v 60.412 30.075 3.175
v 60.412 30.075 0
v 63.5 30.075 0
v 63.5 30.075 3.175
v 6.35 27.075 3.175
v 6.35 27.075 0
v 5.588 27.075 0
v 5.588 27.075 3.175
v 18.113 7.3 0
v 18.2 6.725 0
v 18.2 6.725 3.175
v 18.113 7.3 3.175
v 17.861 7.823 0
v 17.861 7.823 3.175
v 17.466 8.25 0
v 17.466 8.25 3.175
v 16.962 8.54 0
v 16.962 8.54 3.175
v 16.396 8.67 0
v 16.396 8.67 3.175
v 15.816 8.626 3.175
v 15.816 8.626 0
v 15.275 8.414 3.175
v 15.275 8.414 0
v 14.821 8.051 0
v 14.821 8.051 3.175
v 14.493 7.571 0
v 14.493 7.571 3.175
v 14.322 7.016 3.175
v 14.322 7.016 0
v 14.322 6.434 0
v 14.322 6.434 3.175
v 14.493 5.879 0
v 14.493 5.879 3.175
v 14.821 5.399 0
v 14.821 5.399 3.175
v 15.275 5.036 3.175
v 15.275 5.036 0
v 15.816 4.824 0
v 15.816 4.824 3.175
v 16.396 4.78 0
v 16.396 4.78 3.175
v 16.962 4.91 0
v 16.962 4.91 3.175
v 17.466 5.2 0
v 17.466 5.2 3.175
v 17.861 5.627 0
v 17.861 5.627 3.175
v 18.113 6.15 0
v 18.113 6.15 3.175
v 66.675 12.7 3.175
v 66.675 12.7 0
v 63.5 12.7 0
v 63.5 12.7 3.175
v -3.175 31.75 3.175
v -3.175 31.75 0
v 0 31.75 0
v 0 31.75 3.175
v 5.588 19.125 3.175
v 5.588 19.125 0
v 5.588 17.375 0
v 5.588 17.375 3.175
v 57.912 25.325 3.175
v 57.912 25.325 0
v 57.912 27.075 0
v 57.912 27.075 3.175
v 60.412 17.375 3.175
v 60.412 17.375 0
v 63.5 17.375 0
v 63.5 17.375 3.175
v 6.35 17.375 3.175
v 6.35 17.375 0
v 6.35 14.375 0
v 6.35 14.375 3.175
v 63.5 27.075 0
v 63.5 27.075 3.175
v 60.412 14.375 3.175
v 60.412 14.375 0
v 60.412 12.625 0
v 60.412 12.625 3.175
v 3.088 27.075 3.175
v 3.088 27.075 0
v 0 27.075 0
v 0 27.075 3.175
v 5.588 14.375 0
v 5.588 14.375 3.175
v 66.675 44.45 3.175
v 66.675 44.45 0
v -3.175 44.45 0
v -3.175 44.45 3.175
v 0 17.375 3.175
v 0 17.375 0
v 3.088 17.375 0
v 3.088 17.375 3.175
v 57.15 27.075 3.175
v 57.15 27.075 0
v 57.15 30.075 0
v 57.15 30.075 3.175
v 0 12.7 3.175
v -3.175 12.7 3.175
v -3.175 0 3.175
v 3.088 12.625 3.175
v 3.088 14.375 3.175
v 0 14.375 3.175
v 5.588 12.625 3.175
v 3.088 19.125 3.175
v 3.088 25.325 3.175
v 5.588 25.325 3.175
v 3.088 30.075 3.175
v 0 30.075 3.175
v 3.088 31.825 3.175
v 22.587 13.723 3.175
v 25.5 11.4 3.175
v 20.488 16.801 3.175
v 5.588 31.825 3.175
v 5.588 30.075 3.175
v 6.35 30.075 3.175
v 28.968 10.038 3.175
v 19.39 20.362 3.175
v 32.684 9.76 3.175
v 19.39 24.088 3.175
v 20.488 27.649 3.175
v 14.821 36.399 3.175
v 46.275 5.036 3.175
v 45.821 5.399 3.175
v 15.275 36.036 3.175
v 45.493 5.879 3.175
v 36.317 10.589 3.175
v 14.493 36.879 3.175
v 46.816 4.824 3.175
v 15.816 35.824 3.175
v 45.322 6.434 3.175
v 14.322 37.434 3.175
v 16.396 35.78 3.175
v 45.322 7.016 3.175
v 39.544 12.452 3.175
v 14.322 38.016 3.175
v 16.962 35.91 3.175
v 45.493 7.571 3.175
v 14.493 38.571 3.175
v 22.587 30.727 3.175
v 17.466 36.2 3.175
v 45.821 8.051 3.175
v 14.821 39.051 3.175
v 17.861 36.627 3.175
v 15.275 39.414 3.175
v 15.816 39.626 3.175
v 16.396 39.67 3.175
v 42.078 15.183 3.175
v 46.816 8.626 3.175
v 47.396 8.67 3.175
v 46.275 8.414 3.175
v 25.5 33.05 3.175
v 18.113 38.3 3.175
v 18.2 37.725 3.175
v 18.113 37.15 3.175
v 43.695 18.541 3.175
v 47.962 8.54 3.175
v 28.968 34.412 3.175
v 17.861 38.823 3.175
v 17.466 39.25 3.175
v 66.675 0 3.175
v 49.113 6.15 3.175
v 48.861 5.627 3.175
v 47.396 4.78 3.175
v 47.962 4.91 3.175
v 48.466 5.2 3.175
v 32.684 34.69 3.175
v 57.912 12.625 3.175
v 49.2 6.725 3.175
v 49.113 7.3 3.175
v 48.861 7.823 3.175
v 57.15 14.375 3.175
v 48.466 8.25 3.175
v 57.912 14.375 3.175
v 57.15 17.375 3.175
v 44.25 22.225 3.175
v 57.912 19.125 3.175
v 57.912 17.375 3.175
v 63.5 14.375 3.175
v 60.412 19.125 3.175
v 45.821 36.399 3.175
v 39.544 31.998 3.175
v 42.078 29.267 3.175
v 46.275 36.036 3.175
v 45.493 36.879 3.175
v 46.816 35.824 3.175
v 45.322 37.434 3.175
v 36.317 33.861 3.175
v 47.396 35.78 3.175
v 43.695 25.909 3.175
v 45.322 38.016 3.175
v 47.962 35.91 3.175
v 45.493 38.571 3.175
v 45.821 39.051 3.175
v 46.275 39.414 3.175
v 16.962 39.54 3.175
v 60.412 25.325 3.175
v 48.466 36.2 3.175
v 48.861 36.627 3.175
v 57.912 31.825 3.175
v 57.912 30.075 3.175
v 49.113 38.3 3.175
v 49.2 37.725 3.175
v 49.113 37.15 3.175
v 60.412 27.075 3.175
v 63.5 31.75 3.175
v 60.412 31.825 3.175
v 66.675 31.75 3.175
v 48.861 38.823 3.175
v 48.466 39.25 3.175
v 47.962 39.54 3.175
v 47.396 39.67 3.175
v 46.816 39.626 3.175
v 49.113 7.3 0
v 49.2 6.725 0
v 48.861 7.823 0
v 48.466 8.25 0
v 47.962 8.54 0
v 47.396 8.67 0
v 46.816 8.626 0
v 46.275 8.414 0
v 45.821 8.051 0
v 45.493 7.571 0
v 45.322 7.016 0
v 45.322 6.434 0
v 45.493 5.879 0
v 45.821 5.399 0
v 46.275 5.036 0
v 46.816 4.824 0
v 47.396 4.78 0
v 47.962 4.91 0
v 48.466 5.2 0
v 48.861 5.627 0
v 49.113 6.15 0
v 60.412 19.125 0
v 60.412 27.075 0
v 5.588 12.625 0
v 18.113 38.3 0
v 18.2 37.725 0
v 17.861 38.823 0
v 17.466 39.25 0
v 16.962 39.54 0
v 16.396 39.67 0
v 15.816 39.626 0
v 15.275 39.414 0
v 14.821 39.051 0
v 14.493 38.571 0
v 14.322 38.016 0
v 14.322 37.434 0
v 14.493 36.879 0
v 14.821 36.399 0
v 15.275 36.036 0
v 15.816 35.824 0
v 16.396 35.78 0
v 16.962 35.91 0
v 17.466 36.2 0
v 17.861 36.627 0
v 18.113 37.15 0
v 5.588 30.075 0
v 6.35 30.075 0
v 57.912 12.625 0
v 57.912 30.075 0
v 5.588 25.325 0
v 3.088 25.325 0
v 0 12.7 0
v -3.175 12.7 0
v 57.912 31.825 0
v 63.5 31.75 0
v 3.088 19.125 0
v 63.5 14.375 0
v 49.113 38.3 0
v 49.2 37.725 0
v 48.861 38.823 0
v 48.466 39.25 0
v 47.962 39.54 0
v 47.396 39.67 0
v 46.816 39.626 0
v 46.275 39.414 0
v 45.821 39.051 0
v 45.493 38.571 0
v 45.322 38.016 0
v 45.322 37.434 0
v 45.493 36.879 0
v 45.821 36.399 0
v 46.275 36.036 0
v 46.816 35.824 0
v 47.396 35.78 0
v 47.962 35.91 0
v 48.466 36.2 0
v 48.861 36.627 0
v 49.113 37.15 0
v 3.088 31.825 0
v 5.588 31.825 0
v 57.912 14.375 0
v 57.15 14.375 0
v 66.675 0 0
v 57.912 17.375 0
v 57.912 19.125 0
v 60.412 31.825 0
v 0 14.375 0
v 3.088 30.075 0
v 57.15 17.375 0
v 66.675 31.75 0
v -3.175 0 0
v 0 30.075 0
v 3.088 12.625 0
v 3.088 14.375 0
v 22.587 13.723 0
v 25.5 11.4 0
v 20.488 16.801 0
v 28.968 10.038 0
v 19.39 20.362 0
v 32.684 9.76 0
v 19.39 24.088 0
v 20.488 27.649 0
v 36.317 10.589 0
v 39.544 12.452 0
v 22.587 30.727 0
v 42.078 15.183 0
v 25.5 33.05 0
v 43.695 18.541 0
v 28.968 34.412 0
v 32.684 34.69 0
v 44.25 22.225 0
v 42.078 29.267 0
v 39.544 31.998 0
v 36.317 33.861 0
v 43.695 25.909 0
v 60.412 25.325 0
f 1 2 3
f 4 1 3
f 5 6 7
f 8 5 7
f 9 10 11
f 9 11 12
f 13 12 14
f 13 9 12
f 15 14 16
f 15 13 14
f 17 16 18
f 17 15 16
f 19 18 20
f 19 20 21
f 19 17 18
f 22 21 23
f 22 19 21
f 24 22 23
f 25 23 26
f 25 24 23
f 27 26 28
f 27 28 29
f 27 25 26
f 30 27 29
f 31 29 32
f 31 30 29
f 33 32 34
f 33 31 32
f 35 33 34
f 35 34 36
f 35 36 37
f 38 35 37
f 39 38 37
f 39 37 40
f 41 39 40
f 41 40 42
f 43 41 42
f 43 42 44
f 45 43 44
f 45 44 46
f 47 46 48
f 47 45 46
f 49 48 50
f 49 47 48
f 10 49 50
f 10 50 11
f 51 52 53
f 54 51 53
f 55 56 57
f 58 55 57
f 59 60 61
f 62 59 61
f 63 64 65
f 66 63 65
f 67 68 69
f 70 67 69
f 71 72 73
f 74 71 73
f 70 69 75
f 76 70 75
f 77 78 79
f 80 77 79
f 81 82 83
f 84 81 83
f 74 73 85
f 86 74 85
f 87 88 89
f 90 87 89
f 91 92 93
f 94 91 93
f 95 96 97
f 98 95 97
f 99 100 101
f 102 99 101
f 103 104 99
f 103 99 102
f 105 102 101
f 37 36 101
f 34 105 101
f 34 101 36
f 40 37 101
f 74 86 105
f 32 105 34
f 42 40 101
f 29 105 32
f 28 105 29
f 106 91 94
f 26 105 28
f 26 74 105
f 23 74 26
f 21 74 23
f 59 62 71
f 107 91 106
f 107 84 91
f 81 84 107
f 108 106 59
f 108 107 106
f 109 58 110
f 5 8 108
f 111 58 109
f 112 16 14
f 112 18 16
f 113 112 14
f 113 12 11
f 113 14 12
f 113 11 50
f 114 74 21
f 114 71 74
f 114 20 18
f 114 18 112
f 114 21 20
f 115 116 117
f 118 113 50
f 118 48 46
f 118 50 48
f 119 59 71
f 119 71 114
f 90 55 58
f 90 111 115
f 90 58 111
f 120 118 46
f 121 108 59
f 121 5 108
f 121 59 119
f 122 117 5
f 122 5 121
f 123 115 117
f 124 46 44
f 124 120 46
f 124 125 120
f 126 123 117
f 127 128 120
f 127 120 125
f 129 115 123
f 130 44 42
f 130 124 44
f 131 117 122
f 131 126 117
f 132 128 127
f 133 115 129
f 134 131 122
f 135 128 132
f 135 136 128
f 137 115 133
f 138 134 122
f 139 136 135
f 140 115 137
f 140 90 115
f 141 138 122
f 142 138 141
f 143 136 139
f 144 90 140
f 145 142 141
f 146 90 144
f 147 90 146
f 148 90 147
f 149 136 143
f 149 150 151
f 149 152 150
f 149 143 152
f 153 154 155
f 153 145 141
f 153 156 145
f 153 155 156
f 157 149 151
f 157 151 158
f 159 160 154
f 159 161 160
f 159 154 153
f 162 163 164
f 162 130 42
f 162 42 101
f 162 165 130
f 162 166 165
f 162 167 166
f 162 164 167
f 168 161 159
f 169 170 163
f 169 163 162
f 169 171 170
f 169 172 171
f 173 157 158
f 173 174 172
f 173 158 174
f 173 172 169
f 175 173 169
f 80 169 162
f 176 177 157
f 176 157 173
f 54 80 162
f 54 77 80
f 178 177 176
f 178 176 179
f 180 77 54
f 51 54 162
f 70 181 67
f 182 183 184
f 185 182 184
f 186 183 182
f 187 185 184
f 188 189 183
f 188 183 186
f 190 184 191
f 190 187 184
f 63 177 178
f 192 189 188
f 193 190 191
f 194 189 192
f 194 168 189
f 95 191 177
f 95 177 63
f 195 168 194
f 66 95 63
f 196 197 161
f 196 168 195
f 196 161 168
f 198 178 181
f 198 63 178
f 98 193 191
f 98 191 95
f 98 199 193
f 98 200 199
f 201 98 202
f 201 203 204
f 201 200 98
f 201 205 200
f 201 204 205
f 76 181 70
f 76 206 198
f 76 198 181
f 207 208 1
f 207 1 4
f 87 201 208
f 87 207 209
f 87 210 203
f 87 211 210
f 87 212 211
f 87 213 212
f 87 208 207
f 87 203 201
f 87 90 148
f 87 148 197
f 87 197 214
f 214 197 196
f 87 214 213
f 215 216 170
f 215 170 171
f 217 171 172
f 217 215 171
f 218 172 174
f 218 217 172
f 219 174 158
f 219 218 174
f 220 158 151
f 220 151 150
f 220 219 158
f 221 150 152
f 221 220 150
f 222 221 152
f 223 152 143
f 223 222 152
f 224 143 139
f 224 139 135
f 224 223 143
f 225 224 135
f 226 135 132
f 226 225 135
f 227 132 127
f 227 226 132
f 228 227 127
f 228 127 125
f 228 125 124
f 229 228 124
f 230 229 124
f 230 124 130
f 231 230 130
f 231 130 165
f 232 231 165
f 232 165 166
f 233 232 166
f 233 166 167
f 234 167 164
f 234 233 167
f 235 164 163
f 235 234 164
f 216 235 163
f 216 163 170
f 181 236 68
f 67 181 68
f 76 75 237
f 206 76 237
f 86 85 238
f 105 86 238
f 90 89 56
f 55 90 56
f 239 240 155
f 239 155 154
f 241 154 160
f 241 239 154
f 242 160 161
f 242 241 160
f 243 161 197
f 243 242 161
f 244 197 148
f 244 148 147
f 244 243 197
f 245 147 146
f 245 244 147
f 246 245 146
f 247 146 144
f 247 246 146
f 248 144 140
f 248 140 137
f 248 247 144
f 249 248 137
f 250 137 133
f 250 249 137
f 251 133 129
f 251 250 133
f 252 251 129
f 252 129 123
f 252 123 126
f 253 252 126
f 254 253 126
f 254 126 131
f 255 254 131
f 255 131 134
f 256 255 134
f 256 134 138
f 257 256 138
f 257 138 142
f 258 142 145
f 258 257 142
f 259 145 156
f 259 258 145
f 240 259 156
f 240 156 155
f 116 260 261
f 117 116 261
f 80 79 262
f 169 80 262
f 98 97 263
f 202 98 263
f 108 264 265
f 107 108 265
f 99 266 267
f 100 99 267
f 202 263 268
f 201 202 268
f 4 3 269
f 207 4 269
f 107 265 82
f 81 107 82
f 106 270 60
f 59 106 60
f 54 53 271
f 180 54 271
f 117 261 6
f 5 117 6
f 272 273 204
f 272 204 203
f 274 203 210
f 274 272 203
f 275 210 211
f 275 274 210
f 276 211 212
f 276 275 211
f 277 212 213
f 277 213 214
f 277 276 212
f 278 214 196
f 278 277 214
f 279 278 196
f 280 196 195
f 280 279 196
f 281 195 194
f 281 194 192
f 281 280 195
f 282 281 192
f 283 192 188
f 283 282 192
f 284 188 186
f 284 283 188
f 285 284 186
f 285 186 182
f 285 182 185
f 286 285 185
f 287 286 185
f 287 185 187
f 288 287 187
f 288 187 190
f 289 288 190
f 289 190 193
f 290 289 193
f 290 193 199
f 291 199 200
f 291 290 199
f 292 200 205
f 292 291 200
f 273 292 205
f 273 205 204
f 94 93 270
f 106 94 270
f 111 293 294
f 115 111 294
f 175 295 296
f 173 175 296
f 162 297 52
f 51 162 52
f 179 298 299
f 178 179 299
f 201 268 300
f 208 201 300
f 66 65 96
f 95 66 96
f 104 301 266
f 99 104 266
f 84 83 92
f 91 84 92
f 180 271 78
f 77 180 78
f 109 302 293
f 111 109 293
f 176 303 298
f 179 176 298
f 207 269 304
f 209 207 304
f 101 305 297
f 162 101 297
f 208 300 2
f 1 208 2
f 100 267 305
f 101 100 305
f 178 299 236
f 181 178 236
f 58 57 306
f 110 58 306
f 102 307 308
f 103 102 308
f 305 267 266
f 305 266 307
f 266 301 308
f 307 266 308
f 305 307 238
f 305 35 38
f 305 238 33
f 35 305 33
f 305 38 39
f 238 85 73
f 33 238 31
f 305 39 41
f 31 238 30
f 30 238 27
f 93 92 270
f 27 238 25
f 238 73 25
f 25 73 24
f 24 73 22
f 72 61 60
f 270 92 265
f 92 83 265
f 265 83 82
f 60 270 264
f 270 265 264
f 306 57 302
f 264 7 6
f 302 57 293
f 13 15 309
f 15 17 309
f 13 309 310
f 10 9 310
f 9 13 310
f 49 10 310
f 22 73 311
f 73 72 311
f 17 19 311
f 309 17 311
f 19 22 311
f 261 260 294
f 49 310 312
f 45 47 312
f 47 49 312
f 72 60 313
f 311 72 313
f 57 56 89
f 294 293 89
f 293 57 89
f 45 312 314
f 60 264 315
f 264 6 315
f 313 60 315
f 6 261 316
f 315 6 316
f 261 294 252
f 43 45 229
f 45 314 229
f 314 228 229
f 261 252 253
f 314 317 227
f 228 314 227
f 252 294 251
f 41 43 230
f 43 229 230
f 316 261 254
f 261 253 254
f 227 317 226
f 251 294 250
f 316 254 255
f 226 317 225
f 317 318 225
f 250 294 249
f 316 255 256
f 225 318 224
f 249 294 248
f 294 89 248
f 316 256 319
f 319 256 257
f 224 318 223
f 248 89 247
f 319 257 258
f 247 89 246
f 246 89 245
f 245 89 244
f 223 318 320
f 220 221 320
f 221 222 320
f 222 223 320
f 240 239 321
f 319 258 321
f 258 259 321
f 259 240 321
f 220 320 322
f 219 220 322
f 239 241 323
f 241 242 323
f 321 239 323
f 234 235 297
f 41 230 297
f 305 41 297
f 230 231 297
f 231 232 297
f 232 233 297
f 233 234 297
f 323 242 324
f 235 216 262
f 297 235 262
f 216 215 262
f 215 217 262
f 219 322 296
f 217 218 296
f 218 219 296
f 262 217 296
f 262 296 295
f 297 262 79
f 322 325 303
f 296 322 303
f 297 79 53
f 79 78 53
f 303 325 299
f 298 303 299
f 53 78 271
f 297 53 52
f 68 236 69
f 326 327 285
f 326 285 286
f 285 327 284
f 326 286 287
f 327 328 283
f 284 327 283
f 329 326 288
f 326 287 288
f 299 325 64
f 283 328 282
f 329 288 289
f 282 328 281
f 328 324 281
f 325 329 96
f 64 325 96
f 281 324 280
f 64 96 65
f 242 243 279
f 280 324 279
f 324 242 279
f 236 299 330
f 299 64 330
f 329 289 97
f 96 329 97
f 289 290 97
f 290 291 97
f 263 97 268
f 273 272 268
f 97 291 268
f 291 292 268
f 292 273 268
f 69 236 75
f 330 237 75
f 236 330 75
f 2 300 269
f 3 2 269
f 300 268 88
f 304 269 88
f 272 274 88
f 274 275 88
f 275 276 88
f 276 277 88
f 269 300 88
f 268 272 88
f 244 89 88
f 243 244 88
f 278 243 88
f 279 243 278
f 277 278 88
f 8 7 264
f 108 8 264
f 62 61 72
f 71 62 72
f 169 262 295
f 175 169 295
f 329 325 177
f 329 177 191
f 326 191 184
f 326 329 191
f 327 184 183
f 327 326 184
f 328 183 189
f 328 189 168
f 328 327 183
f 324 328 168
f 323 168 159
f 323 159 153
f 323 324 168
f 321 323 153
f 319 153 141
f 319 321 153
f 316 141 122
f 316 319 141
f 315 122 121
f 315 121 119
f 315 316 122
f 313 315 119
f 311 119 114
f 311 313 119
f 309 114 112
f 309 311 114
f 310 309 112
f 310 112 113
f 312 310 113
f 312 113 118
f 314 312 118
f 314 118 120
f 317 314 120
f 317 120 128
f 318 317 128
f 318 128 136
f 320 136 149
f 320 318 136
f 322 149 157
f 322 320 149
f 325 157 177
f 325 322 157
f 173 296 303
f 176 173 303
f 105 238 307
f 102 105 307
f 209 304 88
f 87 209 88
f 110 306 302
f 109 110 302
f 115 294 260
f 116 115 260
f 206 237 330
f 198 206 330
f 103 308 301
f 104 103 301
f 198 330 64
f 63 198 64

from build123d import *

# Parameters (mm, degrees)
SKETCH2_R           = 1.95
SKETCH2_R_2         = 12.5
BOSS_EXTRUDE1_DEPTH = 3.175


with BuildPart() as part:
    # Sketch2 → Boss-Extrude1 (new body)
    with BuildSketch(Plane.XY):
        Polygon((-3.175, 0), (66.675, 0), (66.675, 12.7), (63.5, 12.7), (63.5, 14.375), (60.412, 14.375), (60.412, 12.625), (57.912, 12.625), (57.912, 14.375), (57.15, 14.375), (57.15, 17.375), (57.912, 17.375), (57.912, 19.125), (60.412, 19.125), (60.412, 17.375), (63.5, 17.375), (63.5, 27.075), (60.412, 27.075), (60.412, 25.325), (57.912, 25.325), (57.912, 27.075), (57.15, 27.075), (57.15, 30.075), (57.912, 30.075), (57.912, 31.825), (60.412, 31.825), (60.412, 30.075), (63.5, 30.075), (63.5, 31.75), (66.675, 31.75), (66.675, 44.45), (-3.175, 44.45), (-3.175, 31.75), (0, 31.75), (0, 30.075), (3.088, 30.075), (3.088, 31.825), (5.588, 31.825), (5.588, 30.075), (6.35, 30.075), (6.35, 27.075), (5.588, 27.075), (5.588, 25.325), (3.088, 25.325), (3.088, 27.075), (0, 27.075), (0, 17.375), (3.088, 17.375), (3.088, 19.125), (5.588, 19.125), (5.588, 17.375), (6.35, 17.375), (6.35, 14.375), (5.588, 14.375), (5.588, 12.625), (3.088, 12.625), (3.088, 14.375), (0, 14.375), (0, 12.7), (-3.175, 12.7), align=None)
        with Locations((16.25, 6.725)):
            Circle(SKETCH2_R, mode=Mode.SUBTRACT)
        with Locations((47.25, 6.725)):
            Circle(SKETCH2_R, mode=Mode.SUBTRACT)
        with Locations((16.25, 37.725)):
            Circle(SKETCH2_R, mode=Mode.SUBTRACT)
        with Locations((31.75, 22.225)):
            Circle(SKETCH2_R_2, mode=Mode.SUBTRACT)
        with Locations((47.25, 37.725)):
            Circle(SKETCH2_R, mode=Mode.SUBTRACT)
    extrude(amount=BOSS_EXTRUDE1_DEPTH)


solid = part.part
